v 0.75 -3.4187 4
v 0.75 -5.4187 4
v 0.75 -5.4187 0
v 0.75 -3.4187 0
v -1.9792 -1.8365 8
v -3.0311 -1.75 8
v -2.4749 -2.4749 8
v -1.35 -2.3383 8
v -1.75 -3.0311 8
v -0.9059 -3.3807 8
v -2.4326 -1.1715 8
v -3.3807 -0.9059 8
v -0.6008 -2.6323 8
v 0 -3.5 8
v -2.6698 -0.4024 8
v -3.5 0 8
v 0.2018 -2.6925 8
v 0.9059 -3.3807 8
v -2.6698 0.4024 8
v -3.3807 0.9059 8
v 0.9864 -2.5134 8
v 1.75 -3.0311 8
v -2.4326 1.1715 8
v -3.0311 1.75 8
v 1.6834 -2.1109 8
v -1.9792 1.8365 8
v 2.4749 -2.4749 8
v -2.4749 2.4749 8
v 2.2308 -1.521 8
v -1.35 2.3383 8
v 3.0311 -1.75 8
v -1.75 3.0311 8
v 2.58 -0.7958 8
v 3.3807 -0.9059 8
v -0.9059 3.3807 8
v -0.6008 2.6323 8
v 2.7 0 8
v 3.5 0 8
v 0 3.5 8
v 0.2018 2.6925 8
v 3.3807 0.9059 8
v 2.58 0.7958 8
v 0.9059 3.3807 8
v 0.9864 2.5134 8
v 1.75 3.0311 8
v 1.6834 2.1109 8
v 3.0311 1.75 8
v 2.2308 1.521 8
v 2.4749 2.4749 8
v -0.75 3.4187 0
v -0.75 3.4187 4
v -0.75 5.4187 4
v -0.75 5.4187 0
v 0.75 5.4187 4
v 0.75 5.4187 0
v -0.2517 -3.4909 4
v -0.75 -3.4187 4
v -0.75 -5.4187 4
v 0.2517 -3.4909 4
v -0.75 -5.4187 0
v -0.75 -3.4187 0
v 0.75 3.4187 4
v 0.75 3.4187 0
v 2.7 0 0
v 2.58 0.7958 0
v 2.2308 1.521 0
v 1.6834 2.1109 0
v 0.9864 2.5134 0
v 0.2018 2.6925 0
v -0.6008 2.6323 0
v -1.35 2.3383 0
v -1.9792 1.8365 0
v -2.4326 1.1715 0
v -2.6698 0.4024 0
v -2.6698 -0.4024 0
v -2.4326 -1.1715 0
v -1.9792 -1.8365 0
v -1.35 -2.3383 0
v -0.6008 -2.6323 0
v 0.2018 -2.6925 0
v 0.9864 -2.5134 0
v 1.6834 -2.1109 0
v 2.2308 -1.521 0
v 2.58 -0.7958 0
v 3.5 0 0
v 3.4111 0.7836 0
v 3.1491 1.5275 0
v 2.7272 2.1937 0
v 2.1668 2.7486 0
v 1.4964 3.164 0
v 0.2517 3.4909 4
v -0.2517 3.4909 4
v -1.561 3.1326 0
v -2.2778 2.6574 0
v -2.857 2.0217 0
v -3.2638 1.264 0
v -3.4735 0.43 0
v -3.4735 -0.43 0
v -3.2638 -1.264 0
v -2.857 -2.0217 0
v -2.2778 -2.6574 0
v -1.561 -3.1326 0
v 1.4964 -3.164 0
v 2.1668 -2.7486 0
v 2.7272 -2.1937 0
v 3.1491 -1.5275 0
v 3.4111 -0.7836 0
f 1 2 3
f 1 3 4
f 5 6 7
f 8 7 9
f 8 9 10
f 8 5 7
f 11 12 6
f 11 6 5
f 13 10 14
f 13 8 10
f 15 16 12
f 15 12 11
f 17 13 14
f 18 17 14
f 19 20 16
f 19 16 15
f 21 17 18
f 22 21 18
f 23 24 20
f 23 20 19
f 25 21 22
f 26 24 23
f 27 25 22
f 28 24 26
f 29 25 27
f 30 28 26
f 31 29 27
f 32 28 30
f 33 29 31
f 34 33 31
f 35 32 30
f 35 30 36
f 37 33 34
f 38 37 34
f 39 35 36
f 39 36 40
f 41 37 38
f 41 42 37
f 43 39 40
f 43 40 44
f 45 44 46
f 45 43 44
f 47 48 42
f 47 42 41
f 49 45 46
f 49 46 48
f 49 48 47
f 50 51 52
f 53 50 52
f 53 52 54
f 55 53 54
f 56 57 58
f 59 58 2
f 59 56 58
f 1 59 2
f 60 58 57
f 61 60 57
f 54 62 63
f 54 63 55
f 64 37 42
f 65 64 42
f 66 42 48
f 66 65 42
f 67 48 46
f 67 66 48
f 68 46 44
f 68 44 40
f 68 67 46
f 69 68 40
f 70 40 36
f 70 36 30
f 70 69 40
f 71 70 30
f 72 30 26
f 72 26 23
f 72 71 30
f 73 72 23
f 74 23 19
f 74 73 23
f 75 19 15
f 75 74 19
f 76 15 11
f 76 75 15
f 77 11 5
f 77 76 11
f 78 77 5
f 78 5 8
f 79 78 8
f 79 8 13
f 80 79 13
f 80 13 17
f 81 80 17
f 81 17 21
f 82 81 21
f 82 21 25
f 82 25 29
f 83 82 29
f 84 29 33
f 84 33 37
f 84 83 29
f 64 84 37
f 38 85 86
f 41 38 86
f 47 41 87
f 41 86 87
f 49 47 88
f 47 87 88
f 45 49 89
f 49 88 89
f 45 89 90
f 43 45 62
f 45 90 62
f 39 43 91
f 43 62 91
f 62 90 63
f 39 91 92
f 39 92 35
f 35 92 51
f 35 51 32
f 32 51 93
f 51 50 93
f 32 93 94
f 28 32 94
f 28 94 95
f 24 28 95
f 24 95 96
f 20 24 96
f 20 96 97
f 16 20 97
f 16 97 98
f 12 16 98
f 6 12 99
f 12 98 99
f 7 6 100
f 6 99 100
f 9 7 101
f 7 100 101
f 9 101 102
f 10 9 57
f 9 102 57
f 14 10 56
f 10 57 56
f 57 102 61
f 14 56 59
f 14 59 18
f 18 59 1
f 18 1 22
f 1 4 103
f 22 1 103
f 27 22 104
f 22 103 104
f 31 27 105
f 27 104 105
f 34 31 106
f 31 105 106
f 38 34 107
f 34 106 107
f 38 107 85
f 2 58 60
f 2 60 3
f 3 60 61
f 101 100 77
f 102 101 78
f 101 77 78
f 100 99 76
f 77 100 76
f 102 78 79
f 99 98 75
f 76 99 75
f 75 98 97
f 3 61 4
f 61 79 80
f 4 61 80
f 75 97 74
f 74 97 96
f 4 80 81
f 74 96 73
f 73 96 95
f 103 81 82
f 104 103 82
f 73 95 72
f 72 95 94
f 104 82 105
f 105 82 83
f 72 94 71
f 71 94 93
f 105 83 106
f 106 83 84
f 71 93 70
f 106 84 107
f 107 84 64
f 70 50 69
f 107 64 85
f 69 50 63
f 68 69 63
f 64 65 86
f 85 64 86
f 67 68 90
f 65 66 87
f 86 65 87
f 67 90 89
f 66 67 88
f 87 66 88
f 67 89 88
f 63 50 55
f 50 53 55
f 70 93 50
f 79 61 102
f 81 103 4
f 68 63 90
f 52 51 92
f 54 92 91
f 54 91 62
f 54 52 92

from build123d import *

# Parameters (mm, degrees)
F0_R     = 3.5
F0_R_2   = 2.7
F1_DEPTH = 8
F3_W     = 1.5
F3_H     = 2
F4_DEPTH = 4


with BuildPart() as f1:
    # F0 (on Top) → F1 (new body)
    with BuildSketch(Plane.XY):
        Circle(F0_R)
        Circle(F0_R_2, mode=Mode.SUBTRACT)
    extrude(amount=F1_DEPTH)

    # F3 (on offset) → F4 (join, through all)
    with BuildSketch(Plane.XY.offset(4)):
        with Locations((0, 4.418699)):
            Rectangle(F3_W, F3_H)
        with Locations((0, -4.418699)):
            Rectangle(F3_W, F3_H)
    extrude(amount=-F4_DEPTH)


solid = f1.part
